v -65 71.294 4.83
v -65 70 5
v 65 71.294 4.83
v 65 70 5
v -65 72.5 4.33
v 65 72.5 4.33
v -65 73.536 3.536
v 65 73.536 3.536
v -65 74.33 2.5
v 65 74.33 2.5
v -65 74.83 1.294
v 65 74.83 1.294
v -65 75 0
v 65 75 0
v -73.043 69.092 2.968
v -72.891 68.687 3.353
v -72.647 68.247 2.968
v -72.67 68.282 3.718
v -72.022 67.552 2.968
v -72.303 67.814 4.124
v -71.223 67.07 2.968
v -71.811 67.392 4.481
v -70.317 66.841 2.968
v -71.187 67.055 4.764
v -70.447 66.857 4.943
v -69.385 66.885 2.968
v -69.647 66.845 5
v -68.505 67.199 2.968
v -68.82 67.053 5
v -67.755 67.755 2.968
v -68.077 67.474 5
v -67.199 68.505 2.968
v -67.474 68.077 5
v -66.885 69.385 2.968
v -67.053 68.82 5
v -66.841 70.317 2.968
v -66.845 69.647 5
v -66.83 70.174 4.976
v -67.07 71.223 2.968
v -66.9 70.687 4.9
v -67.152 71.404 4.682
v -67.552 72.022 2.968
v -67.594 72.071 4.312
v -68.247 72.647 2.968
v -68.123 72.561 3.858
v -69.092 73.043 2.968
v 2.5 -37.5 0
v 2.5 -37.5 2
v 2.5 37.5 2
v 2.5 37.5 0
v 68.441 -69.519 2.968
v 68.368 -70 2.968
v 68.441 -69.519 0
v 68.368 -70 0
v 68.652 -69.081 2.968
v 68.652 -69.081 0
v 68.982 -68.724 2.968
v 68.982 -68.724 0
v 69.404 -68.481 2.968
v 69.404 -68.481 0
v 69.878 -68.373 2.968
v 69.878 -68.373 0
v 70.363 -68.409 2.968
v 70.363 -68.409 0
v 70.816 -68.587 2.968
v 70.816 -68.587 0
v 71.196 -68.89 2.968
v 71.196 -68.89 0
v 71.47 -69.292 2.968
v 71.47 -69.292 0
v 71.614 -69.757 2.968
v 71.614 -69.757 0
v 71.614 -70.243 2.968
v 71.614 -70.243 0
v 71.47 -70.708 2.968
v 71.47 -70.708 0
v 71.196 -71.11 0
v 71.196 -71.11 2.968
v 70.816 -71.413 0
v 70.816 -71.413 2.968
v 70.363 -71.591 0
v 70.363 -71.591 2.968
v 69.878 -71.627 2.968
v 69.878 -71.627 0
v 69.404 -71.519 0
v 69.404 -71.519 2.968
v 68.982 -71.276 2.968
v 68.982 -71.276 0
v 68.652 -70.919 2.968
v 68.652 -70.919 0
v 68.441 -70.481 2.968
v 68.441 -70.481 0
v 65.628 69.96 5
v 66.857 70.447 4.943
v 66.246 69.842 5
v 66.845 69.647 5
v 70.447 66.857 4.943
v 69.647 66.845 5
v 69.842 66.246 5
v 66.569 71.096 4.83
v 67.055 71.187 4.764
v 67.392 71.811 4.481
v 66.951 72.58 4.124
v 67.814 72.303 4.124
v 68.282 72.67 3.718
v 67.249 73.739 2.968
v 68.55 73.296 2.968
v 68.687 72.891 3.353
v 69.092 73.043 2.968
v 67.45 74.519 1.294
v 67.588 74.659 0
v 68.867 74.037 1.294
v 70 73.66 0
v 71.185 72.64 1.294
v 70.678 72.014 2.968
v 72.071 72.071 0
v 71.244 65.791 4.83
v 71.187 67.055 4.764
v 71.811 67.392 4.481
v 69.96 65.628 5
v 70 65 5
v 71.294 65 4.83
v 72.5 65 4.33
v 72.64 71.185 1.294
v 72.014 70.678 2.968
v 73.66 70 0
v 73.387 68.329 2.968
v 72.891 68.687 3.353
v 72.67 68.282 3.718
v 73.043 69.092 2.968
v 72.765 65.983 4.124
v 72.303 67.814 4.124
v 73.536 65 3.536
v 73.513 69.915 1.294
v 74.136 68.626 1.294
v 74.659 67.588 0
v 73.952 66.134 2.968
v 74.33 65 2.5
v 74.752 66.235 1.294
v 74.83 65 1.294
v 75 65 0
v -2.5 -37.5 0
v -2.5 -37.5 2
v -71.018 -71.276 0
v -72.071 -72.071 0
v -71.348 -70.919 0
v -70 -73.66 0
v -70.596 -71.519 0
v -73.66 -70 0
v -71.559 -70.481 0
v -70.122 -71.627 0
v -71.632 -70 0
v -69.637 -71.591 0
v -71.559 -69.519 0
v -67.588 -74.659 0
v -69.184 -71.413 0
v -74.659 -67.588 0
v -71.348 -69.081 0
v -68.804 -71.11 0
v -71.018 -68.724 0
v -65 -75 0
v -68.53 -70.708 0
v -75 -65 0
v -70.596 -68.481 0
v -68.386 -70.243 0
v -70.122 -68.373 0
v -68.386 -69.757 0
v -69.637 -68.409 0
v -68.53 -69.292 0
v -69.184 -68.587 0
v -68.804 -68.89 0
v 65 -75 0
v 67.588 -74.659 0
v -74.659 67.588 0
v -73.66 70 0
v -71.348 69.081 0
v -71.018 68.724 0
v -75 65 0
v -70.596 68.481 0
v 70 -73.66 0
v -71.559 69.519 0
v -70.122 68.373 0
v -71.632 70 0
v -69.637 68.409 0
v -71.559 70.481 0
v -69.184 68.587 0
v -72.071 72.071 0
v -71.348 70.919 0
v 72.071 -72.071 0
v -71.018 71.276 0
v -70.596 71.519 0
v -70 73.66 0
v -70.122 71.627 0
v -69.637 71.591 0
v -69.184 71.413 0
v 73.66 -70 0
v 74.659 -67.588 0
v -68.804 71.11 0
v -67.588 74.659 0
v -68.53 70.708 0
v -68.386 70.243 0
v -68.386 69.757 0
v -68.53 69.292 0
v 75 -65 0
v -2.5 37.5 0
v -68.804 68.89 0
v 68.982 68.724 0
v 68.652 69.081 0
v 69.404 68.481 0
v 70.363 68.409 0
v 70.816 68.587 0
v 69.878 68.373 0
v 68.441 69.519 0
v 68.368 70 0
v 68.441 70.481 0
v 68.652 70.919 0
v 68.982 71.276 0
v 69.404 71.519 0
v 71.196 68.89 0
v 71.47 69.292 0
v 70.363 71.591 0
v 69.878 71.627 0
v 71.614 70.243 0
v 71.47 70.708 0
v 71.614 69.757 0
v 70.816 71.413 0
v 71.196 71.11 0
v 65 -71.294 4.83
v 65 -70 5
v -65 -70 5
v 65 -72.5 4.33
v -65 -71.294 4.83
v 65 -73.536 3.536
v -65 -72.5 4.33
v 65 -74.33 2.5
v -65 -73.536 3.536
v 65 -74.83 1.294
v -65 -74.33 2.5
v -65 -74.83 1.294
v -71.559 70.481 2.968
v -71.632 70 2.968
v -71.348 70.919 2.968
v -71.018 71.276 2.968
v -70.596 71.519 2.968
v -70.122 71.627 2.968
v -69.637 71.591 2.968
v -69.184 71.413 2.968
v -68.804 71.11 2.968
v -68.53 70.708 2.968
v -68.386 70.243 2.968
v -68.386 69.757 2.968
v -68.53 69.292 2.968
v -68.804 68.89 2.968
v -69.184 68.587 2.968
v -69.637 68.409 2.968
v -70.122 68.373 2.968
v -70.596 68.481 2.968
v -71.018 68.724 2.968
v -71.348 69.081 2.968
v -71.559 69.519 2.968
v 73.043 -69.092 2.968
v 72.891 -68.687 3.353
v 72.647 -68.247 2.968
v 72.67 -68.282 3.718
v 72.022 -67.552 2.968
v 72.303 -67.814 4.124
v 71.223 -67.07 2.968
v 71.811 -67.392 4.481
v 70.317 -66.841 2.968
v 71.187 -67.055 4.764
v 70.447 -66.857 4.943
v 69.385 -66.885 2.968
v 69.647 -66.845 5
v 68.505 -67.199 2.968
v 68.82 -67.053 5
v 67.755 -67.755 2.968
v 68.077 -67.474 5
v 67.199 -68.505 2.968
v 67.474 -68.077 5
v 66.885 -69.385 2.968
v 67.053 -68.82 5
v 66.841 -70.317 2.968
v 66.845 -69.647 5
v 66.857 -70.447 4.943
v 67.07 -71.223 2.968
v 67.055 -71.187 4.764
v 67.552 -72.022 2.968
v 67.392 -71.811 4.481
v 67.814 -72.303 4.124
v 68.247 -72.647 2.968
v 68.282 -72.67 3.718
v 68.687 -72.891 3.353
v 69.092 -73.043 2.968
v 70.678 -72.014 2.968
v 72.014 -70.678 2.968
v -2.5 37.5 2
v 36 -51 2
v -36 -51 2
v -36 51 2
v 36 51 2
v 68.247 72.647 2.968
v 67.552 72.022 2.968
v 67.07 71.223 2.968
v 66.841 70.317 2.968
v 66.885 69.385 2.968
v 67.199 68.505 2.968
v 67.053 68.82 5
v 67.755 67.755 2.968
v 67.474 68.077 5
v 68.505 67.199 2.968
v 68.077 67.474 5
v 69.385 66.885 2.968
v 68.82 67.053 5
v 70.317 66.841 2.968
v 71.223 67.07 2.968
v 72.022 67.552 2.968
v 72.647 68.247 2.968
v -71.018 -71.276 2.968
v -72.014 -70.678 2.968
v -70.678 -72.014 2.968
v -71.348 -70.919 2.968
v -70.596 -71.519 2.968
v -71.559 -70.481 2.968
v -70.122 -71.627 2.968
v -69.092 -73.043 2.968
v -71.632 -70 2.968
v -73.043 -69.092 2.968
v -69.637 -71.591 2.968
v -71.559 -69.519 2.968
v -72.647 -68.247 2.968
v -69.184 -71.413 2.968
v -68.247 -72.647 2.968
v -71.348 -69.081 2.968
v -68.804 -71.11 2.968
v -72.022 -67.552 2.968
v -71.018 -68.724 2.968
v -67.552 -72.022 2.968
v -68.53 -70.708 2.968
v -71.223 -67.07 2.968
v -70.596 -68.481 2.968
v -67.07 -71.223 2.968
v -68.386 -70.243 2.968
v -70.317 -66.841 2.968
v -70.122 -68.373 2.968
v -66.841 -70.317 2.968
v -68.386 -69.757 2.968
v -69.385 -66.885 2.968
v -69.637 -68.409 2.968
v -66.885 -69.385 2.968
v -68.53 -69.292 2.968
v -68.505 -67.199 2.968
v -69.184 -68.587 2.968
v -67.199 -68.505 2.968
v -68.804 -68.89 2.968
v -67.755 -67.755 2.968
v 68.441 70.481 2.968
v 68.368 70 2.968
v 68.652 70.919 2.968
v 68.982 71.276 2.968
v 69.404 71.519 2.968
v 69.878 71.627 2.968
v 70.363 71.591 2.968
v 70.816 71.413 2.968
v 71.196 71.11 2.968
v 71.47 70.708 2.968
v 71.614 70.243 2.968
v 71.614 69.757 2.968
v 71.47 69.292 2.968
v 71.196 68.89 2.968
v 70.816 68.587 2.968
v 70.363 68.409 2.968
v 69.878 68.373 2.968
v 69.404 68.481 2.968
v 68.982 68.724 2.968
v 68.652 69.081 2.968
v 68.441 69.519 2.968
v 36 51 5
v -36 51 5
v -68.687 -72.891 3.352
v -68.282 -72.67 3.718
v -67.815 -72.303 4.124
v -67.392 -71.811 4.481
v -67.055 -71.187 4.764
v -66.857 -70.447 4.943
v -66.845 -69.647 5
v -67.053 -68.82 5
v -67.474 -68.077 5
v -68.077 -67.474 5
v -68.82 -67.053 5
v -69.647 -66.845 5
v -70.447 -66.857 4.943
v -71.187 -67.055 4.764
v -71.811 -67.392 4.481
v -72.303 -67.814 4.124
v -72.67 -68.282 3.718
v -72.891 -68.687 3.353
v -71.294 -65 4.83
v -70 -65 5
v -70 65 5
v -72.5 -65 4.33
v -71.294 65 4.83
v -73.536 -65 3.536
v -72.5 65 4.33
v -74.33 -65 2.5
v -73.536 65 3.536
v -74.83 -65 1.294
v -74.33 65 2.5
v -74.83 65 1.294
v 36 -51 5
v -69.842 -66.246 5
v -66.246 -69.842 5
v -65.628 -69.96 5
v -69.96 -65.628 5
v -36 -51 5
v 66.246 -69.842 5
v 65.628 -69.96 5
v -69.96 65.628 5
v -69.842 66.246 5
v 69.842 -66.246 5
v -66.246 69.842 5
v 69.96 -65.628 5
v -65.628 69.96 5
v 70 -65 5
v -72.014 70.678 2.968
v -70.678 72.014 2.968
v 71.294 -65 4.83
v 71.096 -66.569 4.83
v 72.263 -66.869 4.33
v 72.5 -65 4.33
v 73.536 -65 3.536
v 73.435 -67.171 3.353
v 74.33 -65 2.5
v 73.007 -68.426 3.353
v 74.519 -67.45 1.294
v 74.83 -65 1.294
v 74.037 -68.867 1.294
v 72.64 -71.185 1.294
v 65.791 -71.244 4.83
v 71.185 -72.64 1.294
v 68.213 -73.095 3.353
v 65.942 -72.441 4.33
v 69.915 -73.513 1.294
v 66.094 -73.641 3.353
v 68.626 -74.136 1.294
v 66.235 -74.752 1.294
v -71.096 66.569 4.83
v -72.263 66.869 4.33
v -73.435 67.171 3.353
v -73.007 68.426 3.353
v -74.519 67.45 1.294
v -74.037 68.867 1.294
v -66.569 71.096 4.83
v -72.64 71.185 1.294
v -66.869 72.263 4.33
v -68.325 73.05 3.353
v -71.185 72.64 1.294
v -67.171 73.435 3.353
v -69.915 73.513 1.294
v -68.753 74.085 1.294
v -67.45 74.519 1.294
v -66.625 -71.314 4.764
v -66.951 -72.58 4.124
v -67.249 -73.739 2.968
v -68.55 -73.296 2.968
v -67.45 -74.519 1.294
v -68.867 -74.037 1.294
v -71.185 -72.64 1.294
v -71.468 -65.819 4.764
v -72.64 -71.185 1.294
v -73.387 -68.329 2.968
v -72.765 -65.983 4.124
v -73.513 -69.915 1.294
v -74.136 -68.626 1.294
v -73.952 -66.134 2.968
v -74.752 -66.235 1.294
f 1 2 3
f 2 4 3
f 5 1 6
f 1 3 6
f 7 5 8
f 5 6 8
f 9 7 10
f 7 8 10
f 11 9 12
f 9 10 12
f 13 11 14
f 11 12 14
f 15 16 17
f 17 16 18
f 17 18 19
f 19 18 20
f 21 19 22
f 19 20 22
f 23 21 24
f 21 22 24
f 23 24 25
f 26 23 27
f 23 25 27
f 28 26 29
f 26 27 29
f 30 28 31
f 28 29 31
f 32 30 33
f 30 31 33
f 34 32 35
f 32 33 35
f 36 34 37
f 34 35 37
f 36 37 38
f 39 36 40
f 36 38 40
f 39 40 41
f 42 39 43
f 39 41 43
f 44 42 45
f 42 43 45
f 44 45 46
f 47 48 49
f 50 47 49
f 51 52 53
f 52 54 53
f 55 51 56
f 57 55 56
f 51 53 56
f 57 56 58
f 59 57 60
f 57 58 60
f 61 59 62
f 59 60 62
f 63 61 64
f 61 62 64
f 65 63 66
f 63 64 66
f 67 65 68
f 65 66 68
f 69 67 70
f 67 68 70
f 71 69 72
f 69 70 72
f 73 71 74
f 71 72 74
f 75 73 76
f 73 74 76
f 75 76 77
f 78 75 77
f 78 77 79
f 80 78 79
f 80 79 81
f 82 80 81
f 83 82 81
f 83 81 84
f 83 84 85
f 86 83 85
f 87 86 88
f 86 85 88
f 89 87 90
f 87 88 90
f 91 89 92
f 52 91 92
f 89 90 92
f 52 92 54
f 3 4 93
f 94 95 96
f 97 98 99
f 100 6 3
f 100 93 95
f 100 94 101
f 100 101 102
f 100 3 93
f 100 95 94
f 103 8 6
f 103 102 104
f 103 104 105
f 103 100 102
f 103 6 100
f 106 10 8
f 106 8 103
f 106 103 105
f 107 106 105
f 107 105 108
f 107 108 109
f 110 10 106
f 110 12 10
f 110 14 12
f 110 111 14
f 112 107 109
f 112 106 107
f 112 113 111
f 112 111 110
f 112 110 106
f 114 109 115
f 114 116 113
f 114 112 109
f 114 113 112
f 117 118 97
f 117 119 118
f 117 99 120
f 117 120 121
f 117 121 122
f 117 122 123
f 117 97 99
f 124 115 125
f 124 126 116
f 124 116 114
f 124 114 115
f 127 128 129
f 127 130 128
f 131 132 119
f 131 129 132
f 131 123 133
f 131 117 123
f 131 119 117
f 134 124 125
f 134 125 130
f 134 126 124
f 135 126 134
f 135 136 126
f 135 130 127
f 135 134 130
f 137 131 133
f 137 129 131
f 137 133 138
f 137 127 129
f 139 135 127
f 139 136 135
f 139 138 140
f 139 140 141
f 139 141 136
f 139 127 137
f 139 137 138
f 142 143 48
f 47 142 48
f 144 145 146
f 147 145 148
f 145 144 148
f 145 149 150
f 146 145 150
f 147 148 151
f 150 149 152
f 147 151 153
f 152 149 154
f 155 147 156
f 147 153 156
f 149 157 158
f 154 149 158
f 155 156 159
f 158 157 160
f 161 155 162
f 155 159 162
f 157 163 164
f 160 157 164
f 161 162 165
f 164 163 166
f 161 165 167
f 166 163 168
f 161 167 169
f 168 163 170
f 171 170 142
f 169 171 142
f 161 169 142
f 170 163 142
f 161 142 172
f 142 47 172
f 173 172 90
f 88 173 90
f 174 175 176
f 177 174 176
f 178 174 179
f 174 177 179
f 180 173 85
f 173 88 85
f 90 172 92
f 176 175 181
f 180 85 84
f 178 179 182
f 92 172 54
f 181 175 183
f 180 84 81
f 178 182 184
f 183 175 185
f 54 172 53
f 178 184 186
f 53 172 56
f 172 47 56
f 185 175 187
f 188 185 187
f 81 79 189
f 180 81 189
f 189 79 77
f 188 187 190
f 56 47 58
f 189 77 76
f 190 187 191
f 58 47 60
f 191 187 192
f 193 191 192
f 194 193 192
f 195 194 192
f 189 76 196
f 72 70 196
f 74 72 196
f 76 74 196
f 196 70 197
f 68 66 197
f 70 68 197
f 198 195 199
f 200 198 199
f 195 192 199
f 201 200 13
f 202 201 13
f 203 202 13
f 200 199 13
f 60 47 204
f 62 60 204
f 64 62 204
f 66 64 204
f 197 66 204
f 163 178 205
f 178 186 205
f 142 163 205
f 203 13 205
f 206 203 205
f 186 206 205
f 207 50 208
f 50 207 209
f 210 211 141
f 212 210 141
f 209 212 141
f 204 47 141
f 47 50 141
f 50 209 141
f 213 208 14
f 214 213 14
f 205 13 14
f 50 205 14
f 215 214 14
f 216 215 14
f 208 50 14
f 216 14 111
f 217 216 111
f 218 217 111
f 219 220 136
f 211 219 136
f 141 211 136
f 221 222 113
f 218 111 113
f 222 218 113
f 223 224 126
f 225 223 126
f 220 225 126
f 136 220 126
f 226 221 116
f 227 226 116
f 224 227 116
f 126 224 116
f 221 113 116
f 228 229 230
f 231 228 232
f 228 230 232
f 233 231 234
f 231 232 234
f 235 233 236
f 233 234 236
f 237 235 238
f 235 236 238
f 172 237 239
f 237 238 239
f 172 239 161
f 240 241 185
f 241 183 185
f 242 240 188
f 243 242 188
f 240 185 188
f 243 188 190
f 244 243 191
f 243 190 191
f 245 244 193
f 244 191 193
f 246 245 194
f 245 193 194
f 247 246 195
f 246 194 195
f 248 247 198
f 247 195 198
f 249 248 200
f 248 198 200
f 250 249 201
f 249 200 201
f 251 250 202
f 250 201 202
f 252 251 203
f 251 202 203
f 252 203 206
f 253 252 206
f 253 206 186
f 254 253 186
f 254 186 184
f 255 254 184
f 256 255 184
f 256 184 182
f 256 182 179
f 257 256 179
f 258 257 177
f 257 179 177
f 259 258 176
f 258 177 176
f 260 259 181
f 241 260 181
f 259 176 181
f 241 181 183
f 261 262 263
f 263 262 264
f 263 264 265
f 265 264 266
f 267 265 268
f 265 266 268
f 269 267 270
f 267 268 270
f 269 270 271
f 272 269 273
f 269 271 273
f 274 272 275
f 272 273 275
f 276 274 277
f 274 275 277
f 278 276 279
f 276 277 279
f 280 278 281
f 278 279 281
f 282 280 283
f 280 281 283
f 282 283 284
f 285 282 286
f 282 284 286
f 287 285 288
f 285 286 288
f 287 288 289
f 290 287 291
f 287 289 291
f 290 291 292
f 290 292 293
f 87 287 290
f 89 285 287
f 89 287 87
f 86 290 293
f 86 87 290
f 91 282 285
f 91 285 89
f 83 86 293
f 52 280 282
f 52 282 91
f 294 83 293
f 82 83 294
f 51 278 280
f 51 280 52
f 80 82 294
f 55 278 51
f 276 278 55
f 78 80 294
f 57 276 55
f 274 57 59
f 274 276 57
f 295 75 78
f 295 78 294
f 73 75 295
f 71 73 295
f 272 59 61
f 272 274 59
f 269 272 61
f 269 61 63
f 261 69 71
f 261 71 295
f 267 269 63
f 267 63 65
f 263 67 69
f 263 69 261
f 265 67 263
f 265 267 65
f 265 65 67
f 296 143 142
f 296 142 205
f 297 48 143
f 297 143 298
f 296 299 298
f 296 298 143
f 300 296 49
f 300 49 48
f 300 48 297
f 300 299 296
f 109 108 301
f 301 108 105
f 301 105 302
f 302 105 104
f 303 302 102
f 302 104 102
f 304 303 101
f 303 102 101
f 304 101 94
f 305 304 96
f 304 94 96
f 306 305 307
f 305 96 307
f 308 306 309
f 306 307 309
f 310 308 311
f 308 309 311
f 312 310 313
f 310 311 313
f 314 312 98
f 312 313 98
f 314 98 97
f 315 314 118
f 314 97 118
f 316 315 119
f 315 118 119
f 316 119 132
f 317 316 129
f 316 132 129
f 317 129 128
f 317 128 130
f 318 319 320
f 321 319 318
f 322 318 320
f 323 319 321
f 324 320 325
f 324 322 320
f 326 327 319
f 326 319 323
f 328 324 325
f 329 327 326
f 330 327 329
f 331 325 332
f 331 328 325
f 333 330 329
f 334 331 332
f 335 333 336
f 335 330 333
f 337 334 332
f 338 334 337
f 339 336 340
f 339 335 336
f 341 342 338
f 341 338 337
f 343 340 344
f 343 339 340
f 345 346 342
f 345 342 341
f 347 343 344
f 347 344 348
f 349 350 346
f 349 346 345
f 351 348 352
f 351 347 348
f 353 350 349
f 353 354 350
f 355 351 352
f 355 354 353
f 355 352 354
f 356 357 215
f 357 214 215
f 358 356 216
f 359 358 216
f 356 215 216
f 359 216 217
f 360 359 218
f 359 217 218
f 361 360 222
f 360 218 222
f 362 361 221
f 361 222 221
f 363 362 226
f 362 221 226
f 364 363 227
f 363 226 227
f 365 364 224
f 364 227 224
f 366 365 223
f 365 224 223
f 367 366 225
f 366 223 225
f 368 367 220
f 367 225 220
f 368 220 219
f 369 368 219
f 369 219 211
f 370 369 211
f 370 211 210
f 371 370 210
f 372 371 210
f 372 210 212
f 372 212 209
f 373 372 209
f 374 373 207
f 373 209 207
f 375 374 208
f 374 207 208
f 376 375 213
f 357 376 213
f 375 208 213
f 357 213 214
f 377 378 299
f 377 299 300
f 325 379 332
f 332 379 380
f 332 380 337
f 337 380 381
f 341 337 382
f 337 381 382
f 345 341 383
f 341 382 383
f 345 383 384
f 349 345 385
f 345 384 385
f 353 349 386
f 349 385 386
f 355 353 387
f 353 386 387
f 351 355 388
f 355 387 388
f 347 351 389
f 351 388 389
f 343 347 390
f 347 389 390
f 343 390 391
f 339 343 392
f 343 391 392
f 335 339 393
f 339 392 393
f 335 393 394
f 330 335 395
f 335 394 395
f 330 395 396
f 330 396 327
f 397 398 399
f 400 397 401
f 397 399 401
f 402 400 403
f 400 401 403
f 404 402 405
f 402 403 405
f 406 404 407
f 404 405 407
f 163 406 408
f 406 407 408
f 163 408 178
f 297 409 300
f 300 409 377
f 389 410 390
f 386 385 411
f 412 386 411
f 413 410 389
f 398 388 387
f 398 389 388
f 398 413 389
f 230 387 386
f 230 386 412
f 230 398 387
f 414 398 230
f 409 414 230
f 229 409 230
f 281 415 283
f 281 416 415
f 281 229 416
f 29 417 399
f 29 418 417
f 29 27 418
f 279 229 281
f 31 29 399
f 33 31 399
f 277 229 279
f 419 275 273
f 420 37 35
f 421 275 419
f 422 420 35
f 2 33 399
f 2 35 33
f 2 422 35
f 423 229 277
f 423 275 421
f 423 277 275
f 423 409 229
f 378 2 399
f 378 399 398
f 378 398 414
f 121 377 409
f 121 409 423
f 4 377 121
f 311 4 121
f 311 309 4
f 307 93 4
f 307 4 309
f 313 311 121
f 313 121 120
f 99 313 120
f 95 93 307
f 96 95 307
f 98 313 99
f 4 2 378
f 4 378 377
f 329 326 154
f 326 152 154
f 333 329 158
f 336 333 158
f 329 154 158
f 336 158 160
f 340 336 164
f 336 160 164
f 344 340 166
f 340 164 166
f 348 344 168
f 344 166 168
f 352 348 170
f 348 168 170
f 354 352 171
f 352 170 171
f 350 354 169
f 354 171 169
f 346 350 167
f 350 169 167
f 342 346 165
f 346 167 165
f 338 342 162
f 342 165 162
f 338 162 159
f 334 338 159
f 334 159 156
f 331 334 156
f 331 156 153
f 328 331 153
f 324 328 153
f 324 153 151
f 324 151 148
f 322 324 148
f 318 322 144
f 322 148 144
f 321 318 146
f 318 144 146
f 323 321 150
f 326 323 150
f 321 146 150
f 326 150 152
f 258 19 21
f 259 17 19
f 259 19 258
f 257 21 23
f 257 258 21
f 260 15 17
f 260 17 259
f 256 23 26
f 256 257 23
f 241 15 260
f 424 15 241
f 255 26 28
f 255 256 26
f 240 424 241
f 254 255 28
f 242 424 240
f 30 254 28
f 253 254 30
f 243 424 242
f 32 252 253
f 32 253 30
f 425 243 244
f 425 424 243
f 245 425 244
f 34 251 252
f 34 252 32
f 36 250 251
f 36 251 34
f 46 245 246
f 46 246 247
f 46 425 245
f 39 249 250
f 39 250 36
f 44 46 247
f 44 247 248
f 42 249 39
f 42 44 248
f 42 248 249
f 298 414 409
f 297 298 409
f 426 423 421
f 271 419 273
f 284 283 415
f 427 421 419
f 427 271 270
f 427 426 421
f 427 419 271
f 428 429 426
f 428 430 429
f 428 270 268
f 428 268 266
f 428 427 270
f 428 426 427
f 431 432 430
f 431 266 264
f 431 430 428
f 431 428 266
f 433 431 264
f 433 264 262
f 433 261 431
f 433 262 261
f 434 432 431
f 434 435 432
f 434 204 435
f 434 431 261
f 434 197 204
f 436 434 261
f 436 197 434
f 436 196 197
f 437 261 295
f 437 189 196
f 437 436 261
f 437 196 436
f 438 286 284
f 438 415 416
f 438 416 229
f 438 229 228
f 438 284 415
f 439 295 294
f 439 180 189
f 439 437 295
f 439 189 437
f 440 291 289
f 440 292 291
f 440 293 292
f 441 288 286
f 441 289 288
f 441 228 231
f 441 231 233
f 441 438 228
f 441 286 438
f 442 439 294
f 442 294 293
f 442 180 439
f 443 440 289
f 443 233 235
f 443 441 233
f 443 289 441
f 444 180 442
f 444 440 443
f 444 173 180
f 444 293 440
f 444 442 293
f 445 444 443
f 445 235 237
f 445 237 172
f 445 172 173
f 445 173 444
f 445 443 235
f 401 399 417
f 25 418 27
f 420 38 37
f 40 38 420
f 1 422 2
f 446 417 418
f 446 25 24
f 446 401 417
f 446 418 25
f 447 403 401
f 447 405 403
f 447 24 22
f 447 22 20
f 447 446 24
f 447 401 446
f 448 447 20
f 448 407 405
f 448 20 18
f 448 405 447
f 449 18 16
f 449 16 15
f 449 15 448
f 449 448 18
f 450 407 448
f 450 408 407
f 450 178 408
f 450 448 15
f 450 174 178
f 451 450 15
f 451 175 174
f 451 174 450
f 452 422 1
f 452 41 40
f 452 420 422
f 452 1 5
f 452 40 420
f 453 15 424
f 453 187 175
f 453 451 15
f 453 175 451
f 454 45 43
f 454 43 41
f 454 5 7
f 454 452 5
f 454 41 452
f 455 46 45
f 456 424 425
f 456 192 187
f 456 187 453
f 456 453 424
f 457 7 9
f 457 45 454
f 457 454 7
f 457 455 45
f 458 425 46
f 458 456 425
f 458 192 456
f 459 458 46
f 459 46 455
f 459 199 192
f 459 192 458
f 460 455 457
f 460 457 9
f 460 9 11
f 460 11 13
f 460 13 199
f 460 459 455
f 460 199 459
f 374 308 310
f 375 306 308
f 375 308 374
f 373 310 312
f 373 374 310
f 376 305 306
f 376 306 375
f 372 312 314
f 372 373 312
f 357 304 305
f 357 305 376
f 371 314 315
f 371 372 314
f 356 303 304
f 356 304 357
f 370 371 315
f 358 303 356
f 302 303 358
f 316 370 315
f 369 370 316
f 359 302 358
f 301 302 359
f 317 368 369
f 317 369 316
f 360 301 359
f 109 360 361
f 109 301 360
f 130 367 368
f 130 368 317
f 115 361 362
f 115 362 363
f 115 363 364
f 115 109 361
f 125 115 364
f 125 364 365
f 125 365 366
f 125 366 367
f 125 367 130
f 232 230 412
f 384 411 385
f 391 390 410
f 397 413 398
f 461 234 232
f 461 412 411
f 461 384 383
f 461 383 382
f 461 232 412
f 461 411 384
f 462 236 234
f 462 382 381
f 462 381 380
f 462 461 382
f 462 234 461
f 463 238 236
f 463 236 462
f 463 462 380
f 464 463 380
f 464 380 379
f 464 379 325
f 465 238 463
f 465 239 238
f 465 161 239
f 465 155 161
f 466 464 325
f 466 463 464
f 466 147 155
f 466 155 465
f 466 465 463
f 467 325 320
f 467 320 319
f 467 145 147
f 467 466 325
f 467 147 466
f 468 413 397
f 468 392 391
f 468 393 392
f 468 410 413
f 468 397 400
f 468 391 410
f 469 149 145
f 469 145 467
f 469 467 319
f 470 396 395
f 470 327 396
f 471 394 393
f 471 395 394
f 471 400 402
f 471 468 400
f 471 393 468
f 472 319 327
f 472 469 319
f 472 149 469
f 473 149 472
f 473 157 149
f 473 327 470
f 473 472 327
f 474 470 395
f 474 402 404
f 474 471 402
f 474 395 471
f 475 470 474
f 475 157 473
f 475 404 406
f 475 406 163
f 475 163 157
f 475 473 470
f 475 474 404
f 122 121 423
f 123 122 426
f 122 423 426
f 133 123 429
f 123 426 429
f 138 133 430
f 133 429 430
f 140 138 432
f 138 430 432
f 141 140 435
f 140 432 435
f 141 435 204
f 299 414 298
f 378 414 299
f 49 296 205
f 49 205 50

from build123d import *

# Parameters (mm, degrees)
CROQUIS1_W                                           = 150
CROQUIS1_H                                           = 150
SALIENTE_EXTRUIR1_DEPTH                              = 5
CROQUIS2_W                                           = 72
CROQUIS2_H                                           = 102
CORTAR_EXTRUIR1_DEPTH                                = 3
CROQUIS3_W                                           = 5
CROQUIS3_H                                           = 75
CORTAR_EXTRUIR2_DEPTH                                = 10
REDONDEO1_R                                          = 10
REDONDEO3_R                                          = 5
REFRENTADO_PARA_TORNILLO_CON_CABEZA_TRON_D           = 3.2639
REFRENTADO_PARA_TORNILLO_CON_CABEZA_TRON_DEPTH       = 50
REFRENTADO_PARA_TORNILLO_CON_CABEZA_TRON_CBORE_D     = 6.35
REFRENTADO_PARA_TORNILLO_CON_CABEZA_TRON_CBORE_DEPTH = 2.032
REFRENTADO_PARA_TORNILLO_CON_CABEZA_TRON_TIP         = 0.980574487


with BuildPart() as part:
    # Croquis1 → Saliente-Extruir1 (new body)
    with BuildSketch(Plane.XY):
        Rectangle(CROQUIS1_W, CROQUIS1_H)
    extrude(amount=SALIENTE_EXTRUIR1_DEPTH)

    # Croquis2 → Cortar-Extruir1 (cut)
    with BuildSketch(Plane.XY.offset(5)):
        Rectangle(CROQUIS2_W, CROQUIS2_H)
    extrude(amount=-CORTAR_EXTRUIR1_DEPTH, mode=Mode.SUBTRACT)

    # Croquis3 → Cortar-Extruir2 (cut)
    with BuildSketch(Plane.XY.offset(5)):
        Rectangle(CROQUIS3_W, CROQUIS3_H)
    extrude(amount=-CORTAR_EXTRUIR2_DEPTH, mode=Mode.SUBTRACT)

    # Redondeo1
    redondeo1_edges = [part.edges().sort_by_distance(p)[0] for p in [
        (75, -75, 2.5),
        (-75, -75, 2.5),
        (-75, 75, 2.5),
        (75, 75, 2.5),
    ]]
    fillet(redondeo1_edges, radius=REDONDEO1_R)

    # Redondeo3
    redondeo3_edges = [part.edges().sort_by_distance(p)[0] for p in [
        (72.071067812, 72.071067812, 5),
        (75, 0, 5),
        (72.071067812, -72.071067812, 5),
        (0, -75, 5),
        (-72.071067812, -72.071067812, 5),
        (-75, 0, 5),
        (-72.071067812, 72.071067812, 5),
        (0, 75, 5),
    ]]
    fillet(redondeo3_edges, radius=REDONDEO3_R - 0.0001)  # a hair under: the kernel refuses the full size

    # Refrentado para tornillo con cabeza troncocónica de #41
    with Locations(Plane.XY.offset(5)):
        with Locations((-70, 70), (-70, -70), (70, -70), (70, 70)):
            CounterBoreHole(REFRENTADO_PARA_TORNILLO_CON_CABEZA_TRON_D / 2, REFRENTADO_PARA_TORNILLO_CON_CABEZA_TRON_CBORE_D / 2, REFRENTADO_PARA_TORNILLO_CON_CABEZA_TRON_CBORE_DEPTH, depth=REFRENTADO_PARA_TORNILLO_CON_CABEZA_TRON_DEPTH)
            with Locations((0, 0, -(REFRENTADO_PARA_TORNILLO_CON_CABEZA_TRON_DEPTH + REFRENTADO_PARA_TORNILLO_CON_CABEZA_TRON_TIP / 2))):  # 118° drill point
                Cone(0, REFRENTADO_PARA_TORNILLO_CON_CABEZA_TRON_D / 2, REFRENTADO_PARA_TORNILLO_CON_CABEZA_TRON_TIP, mode=Mode.SUBTRACT)


solid = part.part
